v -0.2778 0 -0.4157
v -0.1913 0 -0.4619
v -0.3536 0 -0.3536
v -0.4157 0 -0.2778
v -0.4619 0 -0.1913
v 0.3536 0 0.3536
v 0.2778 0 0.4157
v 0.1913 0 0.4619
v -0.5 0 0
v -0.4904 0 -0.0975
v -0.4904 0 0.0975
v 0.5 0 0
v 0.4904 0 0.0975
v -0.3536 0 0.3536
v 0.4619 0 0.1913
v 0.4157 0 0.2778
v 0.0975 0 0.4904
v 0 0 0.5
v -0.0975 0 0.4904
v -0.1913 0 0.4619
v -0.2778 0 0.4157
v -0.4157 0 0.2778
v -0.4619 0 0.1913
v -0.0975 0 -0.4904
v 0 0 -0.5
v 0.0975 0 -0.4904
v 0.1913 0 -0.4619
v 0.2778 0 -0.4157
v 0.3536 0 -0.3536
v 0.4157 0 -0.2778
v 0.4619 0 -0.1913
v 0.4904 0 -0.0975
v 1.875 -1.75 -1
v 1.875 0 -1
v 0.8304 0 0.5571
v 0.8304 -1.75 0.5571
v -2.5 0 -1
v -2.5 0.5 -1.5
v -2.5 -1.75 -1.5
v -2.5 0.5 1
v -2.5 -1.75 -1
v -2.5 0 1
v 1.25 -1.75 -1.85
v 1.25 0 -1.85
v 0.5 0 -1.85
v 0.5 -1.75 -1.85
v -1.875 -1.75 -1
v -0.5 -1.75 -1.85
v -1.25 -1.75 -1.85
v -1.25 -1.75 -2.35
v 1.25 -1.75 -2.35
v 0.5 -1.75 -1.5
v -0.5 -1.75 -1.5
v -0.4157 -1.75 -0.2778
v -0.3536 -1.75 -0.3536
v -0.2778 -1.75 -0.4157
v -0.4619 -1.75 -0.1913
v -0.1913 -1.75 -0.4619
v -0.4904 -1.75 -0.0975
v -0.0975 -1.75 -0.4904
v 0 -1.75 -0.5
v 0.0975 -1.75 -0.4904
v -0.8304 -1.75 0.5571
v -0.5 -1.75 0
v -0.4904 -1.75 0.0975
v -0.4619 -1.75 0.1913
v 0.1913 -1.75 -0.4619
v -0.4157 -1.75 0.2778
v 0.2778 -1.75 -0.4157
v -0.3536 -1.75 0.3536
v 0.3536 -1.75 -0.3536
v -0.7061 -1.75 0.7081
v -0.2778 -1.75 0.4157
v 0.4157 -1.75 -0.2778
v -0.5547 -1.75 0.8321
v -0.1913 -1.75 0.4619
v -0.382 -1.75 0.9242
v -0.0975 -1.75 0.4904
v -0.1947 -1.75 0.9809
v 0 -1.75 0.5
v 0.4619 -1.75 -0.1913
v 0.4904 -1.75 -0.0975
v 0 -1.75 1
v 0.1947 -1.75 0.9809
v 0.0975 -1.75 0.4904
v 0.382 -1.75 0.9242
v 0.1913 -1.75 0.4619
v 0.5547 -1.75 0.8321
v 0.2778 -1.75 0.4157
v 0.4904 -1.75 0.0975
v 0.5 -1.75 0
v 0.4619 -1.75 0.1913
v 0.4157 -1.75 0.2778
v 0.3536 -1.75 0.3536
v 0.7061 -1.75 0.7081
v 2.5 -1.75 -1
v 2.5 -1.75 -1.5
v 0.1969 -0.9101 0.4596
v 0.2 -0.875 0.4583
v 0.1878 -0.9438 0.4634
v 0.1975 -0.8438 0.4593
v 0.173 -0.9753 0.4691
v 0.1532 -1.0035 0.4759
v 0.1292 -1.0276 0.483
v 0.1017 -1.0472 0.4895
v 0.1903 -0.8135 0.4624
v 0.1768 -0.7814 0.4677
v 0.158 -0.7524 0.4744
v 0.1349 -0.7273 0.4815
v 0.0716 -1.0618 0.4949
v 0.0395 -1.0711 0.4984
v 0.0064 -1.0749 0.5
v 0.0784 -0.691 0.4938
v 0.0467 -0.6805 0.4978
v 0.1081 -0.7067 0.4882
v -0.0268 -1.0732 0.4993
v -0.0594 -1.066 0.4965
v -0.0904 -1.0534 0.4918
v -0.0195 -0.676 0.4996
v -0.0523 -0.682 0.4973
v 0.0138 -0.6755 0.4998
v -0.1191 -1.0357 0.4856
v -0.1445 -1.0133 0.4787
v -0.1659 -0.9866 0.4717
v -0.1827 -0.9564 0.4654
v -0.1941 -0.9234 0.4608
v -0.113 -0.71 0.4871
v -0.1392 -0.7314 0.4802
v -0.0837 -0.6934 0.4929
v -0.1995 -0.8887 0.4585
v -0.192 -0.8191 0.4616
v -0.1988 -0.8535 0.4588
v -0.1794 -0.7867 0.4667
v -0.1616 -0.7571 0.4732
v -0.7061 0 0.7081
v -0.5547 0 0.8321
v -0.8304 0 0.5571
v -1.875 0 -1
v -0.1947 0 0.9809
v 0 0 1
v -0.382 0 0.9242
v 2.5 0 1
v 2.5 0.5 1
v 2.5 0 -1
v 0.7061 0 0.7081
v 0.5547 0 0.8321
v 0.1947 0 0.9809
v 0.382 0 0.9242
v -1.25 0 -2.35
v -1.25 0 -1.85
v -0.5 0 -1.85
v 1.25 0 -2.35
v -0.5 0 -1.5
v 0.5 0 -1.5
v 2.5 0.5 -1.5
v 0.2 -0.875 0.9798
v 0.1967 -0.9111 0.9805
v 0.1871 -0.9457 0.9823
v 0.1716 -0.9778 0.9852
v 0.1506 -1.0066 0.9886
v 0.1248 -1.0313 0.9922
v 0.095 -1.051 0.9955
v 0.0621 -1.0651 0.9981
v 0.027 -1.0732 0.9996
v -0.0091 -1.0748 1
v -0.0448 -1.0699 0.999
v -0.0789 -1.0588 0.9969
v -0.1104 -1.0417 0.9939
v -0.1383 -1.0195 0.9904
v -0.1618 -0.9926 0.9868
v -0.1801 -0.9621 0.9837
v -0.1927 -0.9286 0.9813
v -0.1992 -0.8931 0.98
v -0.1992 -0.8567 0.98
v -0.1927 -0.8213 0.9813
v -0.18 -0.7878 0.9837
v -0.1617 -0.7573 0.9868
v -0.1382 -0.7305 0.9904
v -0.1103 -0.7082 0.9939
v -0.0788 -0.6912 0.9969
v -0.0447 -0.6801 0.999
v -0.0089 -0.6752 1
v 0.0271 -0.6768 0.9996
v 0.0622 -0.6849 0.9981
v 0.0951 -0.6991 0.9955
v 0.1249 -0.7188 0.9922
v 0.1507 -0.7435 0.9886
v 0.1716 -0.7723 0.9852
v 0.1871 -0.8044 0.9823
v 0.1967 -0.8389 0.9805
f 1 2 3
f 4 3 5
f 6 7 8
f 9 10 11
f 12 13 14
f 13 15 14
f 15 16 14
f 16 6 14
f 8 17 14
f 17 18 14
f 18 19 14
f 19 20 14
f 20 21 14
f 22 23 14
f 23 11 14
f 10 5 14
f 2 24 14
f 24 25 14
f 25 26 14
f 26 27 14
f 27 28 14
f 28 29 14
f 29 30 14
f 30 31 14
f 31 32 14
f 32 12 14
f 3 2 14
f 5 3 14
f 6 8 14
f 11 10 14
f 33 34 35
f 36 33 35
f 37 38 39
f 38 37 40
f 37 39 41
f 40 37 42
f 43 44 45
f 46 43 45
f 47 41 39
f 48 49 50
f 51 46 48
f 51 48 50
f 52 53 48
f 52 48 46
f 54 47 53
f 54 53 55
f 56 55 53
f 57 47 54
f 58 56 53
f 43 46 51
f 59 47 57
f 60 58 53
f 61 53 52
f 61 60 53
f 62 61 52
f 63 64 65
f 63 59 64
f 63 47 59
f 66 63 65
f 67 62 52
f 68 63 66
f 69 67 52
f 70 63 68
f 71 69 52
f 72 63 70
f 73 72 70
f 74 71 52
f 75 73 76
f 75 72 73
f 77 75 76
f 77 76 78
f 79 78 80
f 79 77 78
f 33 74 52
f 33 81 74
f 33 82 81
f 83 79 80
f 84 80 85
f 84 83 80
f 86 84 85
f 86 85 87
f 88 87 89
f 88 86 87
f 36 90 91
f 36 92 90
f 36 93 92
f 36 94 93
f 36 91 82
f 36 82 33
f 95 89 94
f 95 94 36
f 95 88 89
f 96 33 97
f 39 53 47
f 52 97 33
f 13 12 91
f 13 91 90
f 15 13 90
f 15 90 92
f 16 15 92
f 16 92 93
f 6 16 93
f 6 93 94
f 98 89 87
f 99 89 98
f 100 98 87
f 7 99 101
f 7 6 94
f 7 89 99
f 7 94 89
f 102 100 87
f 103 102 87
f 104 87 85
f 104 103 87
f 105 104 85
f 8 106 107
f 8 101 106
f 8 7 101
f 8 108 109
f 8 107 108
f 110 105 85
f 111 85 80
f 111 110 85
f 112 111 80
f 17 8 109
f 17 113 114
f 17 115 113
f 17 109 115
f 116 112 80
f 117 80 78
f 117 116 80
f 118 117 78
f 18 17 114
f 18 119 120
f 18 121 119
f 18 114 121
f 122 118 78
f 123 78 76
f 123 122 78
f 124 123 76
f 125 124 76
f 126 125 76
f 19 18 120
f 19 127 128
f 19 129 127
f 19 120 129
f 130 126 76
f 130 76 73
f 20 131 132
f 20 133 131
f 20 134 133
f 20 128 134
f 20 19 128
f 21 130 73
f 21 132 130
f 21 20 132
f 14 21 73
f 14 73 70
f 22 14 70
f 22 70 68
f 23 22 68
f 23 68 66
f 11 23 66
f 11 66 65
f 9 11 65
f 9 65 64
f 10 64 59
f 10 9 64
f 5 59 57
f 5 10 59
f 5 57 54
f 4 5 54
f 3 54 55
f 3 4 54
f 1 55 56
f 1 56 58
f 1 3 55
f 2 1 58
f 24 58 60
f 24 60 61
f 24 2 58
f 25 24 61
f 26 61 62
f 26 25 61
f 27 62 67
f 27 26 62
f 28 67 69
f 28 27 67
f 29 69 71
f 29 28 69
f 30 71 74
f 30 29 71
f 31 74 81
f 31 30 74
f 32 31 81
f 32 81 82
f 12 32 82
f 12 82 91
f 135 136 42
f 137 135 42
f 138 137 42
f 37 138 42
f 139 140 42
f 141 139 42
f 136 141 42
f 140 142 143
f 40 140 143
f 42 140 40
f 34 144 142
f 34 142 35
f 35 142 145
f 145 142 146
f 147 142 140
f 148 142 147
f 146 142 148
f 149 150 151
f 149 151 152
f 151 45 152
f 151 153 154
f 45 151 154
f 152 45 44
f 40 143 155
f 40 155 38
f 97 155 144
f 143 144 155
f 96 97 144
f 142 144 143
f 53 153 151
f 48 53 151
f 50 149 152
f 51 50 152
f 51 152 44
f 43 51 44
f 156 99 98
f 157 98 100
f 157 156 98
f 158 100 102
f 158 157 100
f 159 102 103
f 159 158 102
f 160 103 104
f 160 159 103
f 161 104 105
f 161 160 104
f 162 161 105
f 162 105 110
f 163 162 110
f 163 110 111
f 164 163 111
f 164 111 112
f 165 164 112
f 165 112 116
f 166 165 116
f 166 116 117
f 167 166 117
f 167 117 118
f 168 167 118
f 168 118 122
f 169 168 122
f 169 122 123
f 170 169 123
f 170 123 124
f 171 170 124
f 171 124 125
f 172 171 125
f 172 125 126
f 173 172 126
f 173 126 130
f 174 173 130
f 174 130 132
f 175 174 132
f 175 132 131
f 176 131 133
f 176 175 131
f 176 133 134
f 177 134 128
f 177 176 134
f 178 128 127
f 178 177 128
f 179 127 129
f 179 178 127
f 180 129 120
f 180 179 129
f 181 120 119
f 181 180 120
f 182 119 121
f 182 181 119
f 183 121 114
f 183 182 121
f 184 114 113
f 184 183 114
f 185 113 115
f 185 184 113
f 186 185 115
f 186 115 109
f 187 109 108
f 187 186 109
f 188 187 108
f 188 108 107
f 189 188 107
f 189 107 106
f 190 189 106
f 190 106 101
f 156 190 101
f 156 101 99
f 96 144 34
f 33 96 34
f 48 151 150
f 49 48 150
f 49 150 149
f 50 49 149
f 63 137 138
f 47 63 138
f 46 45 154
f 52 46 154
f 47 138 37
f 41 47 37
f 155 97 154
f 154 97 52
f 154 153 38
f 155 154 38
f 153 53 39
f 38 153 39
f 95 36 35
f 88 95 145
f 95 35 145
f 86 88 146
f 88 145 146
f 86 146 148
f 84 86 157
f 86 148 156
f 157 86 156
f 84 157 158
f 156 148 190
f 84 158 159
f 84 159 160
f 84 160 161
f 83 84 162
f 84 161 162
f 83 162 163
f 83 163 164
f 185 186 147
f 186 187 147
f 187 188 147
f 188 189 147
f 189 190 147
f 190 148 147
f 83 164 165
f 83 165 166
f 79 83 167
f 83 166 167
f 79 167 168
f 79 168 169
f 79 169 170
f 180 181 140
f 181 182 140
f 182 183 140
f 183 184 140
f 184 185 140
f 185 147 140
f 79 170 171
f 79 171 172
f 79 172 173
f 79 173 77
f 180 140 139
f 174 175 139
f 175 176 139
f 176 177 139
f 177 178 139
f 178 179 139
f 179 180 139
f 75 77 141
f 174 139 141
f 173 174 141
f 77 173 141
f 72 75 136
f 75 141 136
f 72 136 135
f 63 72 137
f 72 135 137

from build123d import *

# Parameters (mm, degrees)
F0_R     = 0.5
F1_DEPTH = 1.75
F2_W     = 5
F2_H     = 2.5
F3_DEPTH = 0.5
F5_R     = 0.2
F6_DEPTH = 0.5427425305


with BuildPart() as f1:
    # F0 (on Front) → F1 (new body)
    with BuildSketch(Plane.XZ):
        with BuildLine():
            Line((-2.5, -1), (-2.5, -1.5))
            Line((-2.5, -1.5), (-0.5, -1.5))
            Line((-0.5, -1.5), (-0.5, -1.85))
            Line((-0.5, -1.85), (-1.25, -1.85))
            Line((-1.25, -1.85), (-1.25, -2.35))
            Line((-1.25, -2.35), (0, -2.35))
            Line((0, -2.35), (1.25, -2.35))
            Line((1.25, -2.35), (1.25, -1.85))
            Line((1.25, -1.85), (0.5, -1.85))
            Line((0.5, -1.85), (0.5, -1.5))
            Line((0.5, -1.5), (2.5, -1.5))
            Line((2.5, -1.5), (2.5, -1))
            Line((2.5, -1), (1.875, -1))
            Line((1.875, -1), (0.830449827, 0.5570934256))
            ThreePointArc((0.830449827, 0.5570934256), (0, 1), (-0.830449827, 0.5570934256))
            Line((-0.830449827, 0.5570934256), (-1.875, -1))
            Line((-1.875, -1), (-2.5, -1))
        make_face()
        Circle(F0_R, mode=Mode.SUBTRACT)
    extrude(amount=F1_DEPTH)

    # F2 (on face) → F3 (join)
    with BuildSketch(Plane(origin=(0, 0, 0), x_dir=(-1, 0, 0), z_dir=(0, 1, 0))):
        with Locations((0, -0.25)):
            Rectangle(F2_W, F2_H)
    extrude(amount=F3_DEPTH)

    # F5 (on offset) → F6 (cut, through all)
    with BuildSketch(Plane(origin=(0, 0, 1), x_dir=(1, 0, 0), z_dir=(0, 0, -1))):
        with Locations((0, 0.875)):
            Circle(F5_R)
    extrude(amount=F6_DEPTH, mode=Mode.SUBTRACT)


solid = f1.part
